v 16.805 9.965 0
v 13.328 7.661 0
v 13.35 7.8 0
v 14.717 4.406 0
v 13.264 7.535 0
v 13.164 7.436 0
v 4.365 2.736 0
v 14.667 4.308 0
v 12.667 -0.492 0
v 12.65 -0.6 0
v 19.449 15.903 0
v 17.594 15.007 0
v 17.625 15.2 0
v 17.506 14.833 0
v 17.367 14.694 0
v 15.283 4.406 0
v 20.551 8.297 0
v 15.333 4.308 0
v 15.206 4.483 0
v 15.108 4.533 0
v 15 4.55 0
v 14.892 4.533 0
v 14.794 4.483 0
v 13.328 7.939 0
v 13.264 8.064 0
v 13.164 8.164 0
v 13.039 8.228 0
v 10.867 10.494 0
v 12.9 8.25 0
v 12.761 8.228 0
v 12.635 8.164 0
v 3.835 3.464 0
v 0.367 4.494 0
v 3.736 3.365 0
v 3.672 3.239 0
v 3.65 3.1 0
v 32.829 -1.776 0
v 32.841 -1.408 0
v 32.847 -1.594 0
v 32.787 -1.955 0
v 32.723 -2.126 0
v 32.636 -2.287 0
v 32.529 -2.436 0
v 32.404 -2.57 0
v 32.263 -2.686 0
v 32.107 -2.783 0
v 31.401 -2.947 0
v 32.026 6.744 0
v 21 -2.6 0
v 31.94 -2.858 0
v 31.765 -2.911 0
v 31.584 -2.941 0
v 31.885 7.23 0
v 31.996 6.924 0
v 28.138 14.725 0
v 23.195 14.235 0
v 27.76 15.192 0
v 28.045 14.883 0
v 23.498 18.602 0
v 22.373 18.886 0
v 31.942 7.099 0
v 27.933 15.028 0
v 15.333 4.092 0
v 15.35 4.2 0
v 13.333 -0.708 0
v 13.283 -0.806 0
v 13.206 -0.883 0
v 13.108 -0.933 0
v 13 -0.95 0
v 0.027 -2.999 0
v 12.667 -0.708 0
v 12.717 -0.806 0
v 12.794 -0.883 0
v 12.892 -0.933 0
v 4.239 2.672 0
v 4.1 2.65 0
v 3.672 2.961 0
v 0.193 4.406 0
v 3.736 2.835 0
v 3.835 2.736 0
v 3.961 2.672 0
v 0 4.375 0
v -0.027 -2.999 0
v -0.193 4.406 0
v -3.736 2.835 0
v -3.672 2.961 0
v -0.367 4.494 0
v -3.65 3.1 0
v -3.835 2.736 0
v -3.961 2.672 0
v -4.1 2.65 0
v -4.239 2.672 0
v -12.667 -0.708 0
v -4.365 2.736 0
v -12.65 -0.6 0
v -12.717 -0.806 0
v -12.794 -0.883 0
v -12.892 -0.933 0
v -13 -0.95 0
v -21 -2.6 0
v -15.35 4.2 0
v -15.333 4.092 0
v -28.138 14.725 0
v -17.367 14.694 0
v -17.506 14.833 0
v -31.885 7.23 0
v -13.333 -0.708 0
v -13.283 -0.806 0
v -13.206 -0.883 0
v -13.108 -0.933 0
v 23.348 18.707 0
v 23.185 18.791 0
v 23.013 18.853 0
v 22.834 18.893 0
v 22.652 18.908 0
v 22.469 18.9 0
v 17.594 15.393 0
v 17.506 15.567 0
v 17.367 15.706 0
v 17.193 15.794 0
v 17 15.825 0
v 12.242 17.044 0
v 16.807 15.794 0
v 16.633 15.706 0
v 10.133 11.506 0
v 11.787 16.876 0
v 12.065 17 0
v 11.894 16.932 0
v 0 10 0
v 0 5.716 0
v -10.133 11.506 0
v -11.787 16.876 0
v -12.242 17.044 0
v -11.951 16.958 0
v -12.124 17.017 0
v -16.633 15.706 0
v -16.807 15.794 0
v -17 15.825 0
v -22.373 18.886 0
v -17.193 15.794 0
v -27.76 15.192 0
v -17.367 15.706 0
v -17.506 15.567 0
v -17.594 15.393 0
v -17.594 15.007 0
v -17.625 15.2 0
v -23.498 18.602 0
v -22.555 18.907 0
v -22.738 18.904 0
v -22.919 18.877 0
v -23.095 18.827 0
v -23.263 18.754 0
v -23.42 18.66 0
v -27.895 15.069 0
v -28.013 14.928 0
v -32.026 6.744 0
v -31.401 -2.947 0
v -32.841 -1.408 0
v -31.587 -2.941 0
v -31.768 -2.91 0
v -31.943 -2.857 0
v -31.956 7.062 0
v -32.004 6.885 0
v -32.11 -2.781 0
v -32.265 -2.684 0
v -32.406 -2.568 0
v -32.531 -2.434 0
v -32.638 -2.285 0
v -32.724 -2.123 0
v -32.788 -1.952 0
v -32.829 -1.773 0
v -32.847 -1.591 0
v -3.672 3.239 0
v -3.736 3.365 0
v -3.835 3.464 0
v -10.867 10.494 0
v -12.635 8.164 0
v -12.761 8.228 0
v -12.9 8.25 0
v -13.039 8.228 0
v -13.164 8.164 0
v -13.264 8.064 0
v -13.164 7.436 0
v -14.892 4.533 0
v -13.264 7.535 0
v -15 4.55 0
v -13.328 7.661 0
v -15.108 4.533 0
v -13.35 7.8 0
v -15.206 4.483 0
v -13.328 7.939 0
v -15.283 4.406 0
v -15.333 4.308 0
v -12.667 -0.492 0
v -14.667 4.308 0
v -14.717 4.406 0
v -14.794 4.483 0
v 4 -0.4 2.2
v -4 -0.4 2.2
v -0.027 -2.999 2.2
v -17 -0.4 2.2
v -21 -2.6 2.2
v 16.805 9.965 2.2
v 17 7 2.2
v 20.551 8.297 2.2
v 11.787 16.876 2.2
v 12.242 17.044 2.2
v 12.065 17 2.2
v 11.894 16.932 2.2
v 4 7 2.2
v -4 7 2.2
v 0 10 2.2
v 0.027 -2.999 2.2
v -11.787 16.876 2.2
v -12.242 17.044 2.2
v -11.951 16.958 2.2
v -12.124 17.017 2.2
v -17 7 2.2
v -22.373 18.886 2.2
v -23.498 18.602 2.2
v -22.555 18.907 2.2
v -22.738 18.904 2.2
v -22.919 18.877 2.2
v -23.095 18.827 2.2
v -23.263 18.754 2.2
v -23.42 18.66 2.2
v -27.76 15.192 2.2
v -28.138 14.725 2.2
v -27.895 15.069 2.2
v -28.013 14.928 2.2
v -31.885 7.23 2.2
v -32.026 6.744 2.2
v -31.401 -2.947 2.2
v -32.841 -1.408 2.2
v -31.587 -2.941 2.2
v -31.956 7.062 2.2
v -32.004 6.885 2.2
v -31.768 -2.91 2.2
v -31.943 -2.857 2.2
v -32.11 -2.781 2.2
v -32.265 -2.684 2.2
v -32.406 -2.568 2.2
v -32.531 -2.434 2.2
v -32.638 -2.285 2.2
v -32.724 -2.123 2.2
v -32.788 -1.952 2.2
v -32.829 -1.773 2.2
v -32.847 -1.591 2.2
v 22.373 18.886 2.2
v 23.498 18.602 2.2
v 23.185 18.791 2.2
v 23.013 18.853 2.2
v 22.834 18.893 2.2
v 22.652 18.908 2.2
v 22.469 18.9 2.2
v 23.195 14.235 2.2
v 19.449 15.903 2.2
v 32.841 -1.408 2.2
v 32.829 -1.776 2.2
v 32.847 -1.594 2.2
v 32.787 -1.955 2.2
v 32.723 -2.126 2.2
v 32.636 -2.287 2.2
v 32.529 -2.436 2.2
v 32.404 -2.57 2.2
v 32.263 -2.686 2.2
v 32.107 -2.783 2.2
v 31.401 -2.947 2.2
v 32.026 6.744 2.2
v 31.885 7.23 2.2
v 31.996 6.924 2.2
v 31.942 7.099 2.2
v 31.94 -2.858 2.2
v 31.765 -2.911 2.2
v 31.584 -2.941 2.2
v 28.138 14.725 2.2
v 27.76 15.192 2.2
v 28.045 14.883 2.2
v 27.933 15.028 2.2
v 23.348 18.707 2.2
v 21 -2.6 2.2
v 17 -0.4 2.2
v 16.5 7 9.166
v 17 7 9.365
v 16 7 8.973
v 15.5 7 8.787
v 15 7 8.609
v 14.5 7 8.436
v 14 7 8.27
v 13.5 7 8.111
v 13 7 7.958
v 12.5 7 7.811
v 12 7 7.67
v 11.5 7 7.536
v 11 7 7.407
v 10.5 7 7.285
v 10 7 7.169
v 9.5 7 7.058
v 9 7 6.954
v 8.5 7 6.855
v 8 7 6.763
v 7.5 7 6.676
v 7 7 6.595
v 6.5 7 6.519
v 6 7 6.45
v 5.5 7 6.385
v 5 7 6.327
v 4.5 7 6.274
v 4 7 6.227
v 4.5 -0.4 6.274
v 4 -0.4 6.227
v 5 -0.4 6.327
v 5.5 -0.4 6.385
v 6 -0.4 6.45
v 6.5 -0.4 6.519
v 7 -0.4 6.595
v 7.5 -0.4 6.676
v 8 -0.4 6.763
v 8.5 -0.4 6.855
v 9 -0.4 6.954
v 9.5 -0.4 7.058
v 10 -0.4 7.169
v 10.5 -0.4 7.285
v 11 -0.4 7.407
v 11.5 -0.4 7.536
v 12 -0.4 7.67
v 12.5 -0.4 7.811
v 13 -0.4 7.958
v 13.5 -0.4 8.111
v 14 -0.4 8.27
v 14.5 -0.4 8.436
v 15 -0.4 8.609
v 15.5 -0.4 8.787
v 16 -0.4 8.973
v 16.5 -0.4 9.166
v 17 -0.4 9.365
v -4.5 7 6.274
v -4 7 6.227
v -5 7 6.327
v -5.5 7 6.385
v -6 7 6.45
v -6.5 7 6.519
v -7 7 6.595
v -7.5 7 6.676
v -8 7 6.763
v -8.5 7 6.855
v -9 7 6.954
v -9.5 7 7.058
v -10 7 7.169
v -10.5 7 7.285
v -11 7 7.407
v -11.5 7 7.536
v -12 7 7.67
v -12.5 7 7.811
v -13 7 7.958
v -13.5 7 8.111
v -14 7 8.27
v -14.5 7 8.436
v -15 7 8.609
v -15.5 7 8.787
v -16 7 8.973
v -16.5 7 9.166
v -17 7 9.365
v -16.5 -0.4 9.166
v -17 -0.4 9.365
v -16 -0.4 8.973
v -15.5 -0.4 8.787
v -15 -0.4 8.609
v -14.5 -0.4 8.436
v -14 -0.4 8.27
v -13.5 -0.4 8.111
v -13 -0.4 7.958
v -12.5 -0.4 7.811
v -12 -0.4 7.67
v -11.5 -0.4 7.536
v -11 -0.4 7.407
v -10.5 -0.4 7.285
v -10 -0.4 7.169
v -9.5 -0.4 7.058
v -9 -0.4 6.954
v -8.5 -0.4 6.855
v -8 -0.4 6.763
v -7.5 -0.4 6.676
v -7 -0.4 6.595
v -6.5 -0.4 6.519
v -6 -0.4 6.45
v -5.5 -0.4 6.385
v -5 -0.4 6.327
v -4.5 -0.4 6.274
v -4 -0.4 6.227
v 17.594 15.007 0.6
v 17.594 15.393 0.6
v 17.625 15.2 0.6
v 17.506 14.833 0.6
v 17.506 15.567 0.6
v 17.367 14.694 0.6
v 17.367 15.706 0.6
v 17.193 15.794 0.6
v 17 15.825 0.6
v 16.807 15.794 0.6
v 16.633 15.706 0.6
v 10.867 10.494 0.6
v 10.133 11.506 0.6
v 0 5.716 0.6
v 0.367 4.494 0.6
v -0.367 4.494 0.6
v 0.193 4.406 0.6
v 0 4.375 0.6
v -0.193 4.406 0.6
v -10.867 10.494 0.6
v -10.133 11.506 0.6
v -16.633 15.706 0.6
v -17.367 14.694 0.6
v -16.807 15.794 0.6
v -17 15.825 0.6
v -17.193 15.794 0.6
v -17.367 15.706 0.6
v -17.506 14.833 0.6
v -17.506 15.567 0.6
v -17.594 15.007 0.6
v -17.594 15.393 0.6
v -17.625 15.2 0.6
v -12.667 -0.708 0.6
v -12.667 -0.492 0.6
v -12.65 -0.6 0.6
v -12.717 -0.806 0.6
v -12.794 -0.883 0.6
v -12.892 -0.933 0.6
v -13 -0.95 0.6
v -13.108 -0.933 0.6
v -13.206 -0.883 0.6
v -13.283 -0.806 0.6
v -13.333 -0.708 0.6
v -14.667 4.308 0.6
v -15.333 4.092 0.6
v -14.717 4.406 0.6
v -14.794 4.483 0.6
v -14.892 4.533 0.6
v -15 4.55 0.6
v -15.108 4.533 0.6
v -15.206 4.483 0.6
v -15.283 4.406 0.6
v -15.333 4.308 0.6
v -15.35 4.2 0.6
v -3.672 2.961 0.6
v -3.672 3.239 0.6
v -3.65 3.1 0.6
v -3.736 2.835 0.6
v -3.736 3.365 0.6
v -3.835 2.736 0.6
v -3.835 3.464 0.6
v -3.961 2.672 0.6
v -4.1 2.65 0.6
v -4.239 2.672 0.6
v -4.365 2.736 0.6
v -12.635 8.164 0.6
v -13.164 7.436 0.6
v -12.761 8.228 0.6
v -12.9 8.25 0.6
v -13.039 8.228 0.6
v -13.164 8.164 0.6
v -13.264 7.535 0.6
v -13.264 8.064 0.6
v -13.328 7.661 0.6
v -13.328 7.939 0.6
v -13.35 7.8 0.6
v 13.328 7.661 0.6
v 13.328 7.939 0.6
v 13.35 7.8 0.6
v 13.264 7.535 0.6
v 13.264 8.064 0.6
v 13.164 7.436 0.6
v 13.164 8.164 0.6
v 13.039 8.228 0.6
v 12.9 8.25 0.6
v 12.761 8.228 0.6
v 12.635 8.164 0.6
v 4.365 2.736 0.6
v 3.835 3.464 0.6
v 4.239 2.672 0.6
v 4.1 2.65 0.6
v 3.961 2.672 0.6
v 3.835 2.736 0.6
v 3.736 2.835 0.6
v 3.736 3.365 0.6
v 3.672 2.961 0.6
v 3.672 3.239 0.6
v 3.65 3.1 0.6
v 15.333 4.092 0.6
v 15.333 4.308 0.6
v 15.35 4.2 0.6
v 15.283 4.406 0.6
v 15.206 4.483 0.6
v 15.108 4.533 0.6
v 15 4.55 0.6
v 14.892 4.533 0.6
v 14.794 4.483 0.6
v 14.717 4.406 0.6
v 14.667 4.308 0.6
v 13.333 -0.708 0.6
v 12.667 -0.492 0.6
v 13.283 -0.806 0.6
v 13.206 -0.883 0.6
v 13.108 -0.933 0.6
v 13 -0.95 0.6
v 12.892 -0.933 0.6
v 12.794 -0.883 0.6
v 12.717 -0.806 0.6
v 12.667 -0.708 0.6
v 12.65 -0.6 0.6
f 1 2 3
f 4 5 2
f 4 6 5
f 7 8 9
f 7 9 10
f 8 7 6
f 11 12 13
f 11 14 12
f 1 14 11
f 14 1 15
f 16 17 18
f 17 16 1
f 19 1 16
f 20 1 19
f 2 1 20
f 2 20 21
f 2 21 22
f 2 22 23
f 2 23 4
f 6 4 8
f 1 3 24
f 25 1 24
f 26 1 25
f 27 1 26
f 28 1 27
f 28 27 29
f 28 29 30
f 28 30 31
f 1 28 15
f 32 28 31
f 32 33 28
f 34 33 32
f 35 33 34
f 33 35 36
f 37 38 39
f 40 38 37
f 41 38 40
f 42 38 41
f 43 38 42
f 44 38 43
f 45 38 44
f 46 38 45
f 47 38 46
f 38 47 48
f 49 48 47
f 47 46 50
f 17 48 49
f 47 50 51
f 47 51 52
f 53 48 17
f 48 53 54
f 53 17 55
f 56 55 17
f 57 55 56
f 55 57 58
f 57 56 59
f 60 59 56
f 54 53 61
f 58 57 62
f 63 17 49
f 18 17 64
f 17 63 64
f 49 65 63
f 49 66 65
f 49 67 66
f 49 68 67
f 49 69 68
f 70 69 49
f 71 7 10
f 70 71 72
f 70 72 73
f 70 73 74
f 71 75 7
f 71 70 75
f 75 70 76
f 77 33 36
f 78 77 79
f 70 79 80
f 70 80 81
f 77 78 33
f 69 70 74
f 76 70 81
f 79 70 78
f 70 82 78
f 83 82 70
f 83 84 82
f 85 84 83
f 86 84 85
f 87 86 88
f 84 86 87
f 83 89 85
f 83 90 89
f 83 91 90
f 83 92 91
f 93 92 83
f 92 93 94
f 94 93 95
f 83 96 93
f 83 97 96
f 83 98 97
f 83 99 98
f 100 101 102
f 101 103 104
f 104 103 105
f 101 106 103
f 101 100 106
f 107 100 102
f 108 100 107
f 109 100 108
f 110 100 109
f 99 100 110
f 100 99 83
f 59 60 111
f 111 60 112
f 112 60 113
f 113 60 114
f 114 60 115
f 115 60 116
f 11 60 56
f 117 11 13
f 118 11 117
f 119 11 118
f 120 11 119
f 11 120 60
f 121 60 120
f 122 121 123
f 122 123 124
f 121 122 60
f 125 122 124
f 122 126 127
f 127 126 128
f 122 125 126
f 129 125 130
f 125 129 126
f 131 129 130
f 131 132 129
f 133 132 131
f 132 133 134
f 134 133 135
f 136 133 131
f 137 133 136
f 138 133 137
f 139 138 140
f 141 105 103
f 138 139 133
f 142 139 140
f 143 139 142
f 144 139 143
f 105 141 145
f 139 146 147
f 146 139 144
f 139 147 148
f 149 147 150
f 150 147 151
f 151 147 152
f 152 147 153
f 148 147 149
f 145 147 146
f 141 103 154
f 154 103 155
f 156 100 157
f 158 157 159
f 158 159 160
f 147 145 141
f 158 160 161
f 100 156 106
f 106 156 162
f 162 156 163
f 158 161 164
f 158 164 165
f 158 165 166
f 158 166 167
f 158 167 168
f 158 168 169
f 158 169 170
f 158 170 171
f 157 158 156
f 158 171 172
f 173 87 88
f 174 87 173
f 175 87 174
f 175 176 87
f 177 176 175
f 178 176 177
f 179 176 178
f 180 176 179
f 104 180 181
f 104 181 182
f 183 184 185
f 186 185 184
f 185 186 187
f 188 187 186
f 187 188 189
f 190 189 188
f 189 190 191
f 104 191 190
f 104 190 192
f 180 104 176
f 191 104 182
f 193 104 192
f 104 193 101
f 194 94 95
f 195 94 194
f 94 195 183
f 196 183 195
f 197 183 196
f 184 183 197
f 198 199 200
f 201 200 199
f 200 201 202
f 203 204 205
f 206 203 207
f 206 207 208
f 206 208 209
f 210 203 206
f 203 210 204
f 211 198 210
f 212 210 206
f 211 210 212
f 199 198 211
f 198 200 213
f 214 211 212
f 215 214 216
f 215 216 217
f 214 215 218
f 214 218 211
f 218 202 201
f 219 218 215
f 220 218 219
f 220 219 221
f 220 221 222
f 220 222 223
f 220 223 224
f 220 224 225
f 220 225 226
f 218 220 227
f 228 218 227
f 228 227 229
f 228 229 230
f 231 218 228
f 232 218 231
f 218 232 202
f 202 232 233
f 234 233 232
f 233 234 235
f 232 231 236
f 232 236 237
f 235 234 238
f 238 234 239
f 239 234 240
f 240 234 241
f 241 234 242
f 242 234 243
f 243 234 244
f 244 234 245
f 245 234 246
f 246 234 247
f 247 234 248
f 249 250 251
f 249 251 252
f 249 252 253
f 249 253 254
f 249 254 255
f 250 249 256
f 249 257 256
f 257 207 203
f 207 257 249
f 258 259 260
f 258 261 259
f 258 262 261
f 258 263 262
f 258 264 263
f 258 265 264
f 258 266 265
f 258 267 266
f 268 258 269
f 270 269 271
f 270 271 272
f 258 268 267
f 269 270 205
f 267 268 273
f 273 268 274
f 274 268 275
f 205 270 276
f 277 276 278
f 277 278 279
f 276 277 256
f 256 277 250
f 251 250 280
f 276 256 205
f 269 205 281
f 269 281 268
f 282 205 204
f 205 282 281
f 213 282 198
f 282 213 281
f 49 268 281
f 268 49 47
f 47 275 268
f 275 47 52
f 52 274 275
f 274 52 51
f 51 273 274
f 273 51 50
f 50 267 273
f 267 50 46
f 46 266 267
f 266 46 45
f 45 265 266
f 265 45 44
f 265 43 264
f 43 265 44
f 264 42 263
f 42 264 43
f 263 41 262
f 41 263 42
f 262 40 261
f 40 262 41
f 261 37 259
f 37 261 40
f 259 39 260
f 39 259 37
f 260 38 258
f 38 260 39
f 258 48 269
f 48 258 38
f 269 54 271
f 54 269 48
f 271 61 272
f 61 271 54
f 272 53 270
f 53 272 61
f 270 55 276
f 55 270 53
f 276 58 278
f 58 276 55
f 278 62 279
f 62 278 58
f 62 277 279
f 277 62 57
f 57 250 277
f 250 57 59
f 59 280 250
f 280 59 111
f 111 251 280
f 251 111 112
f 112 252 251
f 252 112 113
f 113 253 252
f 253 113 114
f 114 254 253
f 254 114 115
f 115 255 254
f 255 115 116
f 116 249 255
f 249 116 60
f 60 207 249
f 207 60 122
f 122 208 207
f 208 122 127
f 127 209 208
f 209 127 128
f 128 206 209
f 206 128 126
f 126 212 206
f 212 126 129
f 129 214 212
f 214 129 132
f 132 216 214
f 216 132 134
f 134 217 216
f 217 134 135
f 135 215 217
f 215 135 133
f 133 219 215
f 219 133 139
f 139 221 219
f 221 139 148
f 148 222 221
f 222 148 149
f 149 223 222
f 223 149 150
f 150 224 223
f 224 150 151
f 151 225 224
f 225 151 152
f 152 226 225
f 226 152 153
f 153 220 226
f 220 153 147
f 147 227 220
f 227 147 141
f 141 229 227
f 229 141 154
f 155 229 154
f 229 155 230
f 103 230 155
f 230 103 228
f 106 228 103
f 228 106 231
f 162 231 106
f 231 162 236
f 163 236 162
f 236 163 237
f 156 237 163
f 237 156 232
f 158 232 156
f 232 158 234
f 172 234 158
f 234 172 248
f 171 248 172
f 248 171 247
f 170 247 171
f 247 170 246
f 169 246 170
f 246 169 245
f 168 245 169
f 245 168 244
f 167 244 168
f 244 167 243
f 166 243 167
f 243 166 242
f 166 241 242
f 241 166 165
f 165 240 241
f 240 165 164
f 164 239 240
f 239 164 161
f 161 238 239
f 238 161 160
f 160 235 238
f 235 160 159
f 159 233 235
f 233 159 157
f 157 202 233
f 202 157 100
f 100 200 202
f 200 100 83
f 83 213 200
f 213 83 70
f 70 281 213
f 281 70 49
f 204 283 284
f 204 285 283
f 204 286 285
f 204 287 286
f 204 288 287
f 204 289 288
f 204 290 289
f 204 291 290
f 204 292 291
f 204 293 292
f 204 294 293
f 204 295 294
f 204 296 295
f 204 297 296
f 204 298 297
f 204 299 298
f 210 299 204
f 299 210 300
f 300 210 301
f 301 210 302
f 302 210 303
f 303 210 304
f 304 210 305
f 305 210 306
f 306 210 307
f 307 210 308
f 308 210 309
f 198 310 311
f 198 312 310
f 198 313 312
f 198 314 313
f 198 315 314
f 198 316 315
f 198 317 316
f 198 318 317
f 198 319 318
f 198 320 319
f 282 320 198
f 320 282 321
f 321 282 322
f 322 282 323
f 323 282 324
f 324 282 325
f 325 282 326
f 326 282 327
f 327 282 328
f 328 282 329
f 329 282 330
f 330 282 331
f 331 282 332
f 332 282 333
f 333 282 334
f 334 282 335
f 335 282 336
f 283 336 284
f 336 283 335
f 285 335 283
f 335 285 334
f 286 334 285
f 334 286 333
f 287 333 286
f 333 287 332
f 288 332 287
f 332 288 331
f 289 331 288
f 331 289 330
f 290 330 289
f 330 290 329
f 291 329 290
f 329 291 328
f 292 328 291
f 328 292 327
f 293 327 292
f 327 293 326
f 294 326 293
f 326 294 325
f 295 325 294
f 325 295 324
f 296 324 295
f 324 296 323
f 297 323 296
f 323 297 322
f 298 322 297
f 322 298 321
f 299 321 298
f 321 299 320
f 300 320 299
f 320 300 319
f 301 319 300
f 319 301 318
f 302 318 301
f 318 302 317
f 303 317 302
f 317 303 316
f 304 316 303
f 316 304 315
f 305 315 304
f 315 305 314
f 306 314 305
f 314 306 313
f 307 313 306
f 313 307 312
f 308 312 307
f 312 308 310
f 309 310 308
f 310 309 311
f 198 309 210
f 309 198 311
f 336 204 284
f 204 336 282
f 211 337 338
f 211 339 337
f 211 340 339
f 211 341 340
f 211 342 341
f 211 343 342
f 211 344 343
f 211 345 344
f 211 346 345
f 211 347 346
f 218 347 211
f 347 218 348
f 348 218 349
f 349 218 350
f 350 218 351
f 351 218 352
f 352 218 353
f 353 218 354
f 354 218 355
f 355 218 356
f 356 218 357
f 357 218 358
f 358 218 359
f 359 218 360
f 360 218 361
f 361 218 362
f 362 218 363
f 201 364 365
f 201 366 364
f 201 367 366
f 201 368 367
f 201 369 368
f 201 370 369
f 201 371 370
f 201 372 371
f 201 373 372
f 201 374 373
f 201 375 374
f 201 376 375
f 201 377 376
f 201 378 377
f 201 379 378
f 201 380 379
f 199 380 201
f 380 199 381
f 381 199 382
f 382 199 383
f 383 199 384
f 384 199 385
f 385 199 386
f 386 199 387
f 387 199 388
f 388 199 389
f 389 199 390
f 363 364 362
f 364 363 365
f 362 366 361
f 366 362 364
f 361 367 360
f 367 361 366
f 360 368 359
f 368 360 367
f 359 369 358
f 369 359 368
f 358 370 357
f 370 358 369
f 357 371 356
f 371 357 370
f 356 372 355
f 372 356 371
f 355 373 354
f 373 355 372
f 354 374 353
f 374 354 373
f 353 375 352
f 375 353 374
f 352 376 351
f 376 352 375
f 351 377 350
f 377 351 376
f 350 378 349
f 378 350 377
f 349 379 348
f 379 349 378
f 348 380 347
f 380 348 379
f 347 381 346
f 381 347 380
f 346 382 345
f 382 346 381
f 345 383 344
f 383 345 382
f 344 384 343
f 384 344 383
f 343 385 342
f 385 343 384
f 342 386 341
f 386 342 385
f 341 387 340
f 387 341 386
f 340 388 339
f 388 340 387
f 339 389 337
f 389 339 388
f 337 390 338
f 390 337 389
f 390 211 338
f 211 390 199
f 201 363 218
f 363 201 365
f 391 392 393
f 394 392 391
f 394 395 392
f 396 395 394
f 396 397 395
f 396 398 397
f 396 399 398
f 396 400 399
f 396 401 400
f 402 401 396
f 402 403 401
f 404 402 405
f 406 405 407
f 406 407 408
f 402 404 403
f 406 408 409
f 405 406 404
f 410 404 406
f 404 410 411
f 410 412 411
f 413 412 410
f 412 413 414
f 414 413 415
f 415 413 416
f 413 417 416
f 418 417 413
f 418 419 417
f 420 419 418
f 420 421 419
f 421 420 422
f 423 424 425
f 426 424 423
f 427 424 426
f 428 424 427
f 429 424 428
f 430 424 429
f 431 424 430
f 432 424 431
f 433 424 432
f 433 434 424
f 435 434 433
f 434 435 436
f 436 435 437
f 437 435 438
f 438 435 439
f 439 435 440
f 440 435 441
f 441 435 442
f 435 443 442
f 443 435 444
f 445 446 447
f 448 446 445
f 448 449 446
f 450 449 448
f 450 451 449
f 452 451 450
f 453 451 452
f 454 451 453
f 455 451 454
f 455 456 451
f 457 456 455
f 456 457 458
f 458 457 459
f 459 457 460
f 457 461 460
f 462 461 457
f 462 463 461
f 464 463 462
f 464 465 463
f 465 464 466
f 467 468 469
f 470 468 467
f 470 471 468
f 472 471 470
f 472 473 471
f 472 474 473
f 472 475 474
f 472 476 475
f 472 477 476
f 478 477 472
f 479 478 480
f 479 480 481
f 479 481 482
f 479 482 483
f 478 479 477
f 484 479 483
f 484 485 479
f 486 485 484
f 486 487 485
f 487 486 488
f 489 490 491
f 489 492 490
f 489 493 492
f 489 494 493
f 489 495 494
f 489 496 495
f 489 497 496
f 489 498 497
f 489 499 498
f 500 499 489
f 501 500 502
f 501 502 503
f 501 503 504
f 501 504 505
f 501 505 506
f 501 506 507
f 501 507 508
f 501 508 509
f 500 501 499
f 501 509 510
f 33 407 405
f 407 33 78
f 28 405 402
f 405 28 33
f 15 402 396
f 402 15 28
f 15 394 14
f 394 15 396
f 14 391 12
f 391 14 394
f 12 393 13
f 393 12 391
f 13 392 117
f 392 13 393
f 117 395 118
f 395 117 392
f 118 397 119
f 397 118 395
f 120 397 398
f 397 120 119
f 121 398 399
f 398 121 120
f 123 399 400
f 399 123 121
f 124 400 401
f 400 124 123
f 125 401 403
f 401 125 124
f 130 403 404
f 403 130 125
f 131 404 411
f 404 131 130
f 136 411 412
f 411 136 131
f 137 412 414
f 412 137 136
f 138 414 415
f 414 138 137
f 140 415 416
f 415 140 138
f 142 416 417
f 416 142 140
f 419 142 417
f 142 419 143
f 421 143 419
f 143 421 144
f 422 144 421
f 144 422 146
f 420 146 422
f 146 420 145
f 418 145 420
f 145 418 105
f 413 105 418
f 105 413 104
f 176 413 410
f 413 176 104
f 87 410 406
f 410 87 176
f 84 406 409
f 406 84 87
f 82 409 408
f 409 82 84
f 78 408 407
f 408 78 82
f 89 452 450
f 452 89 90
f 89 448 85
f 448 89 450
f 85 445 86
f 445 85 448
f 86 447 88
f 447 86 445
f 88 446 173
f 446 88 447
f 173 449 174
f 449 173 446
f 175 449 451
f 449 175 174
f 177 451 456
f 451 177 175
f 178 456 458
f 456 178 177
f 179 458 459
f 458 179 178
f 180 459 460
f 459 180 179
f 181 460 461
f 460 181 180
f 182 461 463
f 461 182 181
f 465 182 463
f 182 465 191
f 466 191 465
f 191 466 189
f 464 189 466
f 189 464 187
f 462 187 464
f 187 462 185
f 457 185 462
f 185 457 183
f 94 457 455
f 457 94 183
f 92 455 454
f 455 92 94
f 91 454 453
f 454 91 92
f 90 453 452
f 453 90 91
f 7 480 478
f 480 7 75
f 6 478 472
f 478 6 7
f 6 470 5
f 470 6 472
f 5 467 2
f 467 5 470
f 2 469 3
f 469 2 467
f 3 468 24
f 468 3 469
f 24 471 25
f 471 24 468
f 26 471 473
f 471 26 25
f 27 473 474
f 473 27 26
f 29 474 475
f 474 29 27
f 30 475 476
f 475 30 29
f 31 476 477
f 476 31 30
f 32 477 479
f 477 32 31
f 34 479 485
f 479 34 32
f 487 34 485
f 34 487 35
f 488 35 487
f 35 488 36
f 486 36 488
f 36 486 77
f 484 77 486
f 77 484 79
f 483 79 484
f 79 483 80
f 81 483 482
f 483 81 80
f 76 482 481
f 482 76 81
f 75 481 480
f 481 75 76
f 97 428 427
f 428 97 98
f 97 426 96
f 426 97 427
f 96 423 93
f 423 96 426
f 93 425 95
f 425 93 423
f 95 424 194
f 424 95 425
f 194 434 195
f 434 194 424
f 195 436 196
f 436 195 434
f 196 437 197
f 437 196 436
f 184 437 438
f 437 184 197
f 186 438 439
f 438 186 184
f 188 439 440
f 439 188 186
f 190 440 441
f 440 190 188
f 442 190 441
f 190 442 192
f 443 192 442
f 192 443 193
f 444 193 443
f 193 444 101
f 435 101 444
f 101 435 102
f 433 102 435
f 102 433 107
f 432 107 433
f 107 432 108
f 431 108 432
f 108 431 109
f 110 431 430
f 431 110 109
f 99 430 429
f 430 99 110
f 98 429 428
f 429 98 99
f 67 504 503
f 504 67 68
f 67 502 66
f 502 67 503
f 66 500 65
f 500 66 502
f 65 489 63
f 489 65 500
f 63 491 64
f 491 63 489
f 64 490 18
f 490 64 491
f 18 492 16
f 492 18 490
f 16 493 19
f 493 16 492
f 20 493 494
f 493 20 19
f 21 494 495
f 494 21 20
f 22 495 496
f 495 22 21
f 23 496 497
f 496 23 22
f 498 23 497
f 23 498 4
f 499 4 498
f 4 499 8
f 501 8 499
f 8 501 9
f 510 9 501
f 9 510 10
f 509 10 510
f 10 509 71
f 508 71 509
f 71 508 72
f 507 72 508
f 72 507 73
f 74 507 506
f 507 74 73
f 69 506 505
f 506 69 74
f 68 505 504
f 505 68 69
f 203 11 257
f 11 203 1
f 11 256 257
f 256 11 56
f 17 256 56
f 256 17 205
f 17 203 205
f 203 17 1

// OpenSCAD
// Removable judge robe and display gavel for StackChan Strider (K151).
// Dimensions in mm. "robe" and "gavel" are oriented on the print bed.
part = "robe";
mount_tape_mm = 0.55;
peg_clearance_mm = 0.25;
$fn = 48;

robe_thickness = 2.2;
stock_collar_radius = 44.7;
robe_front_y = 51.3;
robe_height = 3; // Relative to the bottom of the stock Strider yoke.
gavel_x = 20;
gavel_y = 12.1;
gavel_angle = -24;
gavel_back = 5.4;
peg_width = 3.6;
peg_length = 6;
peg_depth = 3.05;

module stroke(points, width) {
    for (i = [0 : len(points) - 2])
        hull() {
            translate(points[i]) circle(d = width, $fn = 20);
            translate(points[i + 1]) circle(d = width, $fn = 20);
        }
}

module robe_profile() {
    offset(r = 1.4)
        offset(delta = -1.4)
            polygon([
                [-33, -3], [-32, 7], [-28, 15], [-23, 19], [-12, 17],
                [0, 10], [12, 17], [23, 19], [28, 15], [32, 7], [33, -3],
                [21, -2.6], [0, -3], [-21, -2.6]
            ]);
}

module lapels() {
    for (side = [-1, 1])
        scale([side, 1])
            union() {
                stroke([[0, 5], [10.5, 11], [17, 15.2]], 1.25);
                stroke([[4.1, 3.1], [12.9, 7.8]], 0.9);
                stroke([[13, -0.6], [15, 4.2]], 0.7);
            }
}

function mount_depth(x) =
    robe_front_y - sqrt(pow(stock_collar_radius + mount_tape_mm, 2) - x*x);

module tape_pad() {
    // This surface follows the front of the fixed ring, with room for tape.
    pad_profile = concat(
        [[4, robe_thickness - 0.1], [17, robe_thickness - 0.1]],
        [for (x = [17 : -0.5 : 4]) [x, mount_depth(x)]]
    );
    translate([0, 7, 0])
        rotate([90, 0, 0])
            linear_extrude(height = 7.4)
                polygon(pad_profile);
}

module gavel_position() {
    translate([gavel_x, gavel_y, 0])
        rotate([0, 0, gavel_angle])
            children();
}

module robe() {
    difference() {
        union() {
            linear_extrude(height = robe_thickness)
                robe_profile();
            tape_pad();
            mirror([1, 0, 0]) tape_pad();
        }
        translate([0, 0, -0.05])
            linear_extrude(height = 0.65)
                lapels();
        gavel_position()
            translate([0, 0, -0.1])
                linear_extrude(height = robe_thickness + 0.2)
                    square([peg_width + 2*peg_clearance_mm, peg_length + 2*peg_clearance_mm], center = true);
    }
}

module along_x(x0, x1, y, z, radius) {
    translate([x0, y, z])
        rotate([0, 90, 0])
            cylinder(h = x1-x0, r = radius);
}

module gavel() {
    union() {
        intersection() {
            union() {
                along_x(-9.5, 9.5, 12, 2.6, 4.4);
                along_x(-10.5, -7.4, 12, 2.6, 5.05);
                along_x(7.4, 10.5, 12, 2.6, 5.05);
                along_x(-6.5, -5.4, 12, 2.6, 4.65);
                along_x(5.4, 6.5, 12, 2.6, 4.65);
                linear_extrude(height = gavel_back)
                    hull() {
                        translate([0, -8.7]) circle(r = 2.7);
                        translate([0, 1]) circle(r = 2.55);
                        translate([0, 9.5]) circle(r = 2.1);
                    }
                linear_extrude(height = gavel_back)
                    translate([0, -9.8]) circle(r = 3.25);
            }
            translate([-12, -15, 0]) cube([24, 36, gavel_back]);
        }
        translate([0, 0, gavel_back - 0.08])
            linear_extrude(height = peg_depth + 0.08, scale = 0.85)
                square([peg_width, peg_length], center = true);
    }
}

module installed() {
    translate([0, robe_front_y, robe_height])
        rotate([90, 0, 0]) {
            robe();
            gavel_position()
                translate([0, 0, -gavel_back])
                    gavel();
        }
}

if (part == "robe") robe();
if (part == "gavel") gavel();
if (part == "installed") installed();
